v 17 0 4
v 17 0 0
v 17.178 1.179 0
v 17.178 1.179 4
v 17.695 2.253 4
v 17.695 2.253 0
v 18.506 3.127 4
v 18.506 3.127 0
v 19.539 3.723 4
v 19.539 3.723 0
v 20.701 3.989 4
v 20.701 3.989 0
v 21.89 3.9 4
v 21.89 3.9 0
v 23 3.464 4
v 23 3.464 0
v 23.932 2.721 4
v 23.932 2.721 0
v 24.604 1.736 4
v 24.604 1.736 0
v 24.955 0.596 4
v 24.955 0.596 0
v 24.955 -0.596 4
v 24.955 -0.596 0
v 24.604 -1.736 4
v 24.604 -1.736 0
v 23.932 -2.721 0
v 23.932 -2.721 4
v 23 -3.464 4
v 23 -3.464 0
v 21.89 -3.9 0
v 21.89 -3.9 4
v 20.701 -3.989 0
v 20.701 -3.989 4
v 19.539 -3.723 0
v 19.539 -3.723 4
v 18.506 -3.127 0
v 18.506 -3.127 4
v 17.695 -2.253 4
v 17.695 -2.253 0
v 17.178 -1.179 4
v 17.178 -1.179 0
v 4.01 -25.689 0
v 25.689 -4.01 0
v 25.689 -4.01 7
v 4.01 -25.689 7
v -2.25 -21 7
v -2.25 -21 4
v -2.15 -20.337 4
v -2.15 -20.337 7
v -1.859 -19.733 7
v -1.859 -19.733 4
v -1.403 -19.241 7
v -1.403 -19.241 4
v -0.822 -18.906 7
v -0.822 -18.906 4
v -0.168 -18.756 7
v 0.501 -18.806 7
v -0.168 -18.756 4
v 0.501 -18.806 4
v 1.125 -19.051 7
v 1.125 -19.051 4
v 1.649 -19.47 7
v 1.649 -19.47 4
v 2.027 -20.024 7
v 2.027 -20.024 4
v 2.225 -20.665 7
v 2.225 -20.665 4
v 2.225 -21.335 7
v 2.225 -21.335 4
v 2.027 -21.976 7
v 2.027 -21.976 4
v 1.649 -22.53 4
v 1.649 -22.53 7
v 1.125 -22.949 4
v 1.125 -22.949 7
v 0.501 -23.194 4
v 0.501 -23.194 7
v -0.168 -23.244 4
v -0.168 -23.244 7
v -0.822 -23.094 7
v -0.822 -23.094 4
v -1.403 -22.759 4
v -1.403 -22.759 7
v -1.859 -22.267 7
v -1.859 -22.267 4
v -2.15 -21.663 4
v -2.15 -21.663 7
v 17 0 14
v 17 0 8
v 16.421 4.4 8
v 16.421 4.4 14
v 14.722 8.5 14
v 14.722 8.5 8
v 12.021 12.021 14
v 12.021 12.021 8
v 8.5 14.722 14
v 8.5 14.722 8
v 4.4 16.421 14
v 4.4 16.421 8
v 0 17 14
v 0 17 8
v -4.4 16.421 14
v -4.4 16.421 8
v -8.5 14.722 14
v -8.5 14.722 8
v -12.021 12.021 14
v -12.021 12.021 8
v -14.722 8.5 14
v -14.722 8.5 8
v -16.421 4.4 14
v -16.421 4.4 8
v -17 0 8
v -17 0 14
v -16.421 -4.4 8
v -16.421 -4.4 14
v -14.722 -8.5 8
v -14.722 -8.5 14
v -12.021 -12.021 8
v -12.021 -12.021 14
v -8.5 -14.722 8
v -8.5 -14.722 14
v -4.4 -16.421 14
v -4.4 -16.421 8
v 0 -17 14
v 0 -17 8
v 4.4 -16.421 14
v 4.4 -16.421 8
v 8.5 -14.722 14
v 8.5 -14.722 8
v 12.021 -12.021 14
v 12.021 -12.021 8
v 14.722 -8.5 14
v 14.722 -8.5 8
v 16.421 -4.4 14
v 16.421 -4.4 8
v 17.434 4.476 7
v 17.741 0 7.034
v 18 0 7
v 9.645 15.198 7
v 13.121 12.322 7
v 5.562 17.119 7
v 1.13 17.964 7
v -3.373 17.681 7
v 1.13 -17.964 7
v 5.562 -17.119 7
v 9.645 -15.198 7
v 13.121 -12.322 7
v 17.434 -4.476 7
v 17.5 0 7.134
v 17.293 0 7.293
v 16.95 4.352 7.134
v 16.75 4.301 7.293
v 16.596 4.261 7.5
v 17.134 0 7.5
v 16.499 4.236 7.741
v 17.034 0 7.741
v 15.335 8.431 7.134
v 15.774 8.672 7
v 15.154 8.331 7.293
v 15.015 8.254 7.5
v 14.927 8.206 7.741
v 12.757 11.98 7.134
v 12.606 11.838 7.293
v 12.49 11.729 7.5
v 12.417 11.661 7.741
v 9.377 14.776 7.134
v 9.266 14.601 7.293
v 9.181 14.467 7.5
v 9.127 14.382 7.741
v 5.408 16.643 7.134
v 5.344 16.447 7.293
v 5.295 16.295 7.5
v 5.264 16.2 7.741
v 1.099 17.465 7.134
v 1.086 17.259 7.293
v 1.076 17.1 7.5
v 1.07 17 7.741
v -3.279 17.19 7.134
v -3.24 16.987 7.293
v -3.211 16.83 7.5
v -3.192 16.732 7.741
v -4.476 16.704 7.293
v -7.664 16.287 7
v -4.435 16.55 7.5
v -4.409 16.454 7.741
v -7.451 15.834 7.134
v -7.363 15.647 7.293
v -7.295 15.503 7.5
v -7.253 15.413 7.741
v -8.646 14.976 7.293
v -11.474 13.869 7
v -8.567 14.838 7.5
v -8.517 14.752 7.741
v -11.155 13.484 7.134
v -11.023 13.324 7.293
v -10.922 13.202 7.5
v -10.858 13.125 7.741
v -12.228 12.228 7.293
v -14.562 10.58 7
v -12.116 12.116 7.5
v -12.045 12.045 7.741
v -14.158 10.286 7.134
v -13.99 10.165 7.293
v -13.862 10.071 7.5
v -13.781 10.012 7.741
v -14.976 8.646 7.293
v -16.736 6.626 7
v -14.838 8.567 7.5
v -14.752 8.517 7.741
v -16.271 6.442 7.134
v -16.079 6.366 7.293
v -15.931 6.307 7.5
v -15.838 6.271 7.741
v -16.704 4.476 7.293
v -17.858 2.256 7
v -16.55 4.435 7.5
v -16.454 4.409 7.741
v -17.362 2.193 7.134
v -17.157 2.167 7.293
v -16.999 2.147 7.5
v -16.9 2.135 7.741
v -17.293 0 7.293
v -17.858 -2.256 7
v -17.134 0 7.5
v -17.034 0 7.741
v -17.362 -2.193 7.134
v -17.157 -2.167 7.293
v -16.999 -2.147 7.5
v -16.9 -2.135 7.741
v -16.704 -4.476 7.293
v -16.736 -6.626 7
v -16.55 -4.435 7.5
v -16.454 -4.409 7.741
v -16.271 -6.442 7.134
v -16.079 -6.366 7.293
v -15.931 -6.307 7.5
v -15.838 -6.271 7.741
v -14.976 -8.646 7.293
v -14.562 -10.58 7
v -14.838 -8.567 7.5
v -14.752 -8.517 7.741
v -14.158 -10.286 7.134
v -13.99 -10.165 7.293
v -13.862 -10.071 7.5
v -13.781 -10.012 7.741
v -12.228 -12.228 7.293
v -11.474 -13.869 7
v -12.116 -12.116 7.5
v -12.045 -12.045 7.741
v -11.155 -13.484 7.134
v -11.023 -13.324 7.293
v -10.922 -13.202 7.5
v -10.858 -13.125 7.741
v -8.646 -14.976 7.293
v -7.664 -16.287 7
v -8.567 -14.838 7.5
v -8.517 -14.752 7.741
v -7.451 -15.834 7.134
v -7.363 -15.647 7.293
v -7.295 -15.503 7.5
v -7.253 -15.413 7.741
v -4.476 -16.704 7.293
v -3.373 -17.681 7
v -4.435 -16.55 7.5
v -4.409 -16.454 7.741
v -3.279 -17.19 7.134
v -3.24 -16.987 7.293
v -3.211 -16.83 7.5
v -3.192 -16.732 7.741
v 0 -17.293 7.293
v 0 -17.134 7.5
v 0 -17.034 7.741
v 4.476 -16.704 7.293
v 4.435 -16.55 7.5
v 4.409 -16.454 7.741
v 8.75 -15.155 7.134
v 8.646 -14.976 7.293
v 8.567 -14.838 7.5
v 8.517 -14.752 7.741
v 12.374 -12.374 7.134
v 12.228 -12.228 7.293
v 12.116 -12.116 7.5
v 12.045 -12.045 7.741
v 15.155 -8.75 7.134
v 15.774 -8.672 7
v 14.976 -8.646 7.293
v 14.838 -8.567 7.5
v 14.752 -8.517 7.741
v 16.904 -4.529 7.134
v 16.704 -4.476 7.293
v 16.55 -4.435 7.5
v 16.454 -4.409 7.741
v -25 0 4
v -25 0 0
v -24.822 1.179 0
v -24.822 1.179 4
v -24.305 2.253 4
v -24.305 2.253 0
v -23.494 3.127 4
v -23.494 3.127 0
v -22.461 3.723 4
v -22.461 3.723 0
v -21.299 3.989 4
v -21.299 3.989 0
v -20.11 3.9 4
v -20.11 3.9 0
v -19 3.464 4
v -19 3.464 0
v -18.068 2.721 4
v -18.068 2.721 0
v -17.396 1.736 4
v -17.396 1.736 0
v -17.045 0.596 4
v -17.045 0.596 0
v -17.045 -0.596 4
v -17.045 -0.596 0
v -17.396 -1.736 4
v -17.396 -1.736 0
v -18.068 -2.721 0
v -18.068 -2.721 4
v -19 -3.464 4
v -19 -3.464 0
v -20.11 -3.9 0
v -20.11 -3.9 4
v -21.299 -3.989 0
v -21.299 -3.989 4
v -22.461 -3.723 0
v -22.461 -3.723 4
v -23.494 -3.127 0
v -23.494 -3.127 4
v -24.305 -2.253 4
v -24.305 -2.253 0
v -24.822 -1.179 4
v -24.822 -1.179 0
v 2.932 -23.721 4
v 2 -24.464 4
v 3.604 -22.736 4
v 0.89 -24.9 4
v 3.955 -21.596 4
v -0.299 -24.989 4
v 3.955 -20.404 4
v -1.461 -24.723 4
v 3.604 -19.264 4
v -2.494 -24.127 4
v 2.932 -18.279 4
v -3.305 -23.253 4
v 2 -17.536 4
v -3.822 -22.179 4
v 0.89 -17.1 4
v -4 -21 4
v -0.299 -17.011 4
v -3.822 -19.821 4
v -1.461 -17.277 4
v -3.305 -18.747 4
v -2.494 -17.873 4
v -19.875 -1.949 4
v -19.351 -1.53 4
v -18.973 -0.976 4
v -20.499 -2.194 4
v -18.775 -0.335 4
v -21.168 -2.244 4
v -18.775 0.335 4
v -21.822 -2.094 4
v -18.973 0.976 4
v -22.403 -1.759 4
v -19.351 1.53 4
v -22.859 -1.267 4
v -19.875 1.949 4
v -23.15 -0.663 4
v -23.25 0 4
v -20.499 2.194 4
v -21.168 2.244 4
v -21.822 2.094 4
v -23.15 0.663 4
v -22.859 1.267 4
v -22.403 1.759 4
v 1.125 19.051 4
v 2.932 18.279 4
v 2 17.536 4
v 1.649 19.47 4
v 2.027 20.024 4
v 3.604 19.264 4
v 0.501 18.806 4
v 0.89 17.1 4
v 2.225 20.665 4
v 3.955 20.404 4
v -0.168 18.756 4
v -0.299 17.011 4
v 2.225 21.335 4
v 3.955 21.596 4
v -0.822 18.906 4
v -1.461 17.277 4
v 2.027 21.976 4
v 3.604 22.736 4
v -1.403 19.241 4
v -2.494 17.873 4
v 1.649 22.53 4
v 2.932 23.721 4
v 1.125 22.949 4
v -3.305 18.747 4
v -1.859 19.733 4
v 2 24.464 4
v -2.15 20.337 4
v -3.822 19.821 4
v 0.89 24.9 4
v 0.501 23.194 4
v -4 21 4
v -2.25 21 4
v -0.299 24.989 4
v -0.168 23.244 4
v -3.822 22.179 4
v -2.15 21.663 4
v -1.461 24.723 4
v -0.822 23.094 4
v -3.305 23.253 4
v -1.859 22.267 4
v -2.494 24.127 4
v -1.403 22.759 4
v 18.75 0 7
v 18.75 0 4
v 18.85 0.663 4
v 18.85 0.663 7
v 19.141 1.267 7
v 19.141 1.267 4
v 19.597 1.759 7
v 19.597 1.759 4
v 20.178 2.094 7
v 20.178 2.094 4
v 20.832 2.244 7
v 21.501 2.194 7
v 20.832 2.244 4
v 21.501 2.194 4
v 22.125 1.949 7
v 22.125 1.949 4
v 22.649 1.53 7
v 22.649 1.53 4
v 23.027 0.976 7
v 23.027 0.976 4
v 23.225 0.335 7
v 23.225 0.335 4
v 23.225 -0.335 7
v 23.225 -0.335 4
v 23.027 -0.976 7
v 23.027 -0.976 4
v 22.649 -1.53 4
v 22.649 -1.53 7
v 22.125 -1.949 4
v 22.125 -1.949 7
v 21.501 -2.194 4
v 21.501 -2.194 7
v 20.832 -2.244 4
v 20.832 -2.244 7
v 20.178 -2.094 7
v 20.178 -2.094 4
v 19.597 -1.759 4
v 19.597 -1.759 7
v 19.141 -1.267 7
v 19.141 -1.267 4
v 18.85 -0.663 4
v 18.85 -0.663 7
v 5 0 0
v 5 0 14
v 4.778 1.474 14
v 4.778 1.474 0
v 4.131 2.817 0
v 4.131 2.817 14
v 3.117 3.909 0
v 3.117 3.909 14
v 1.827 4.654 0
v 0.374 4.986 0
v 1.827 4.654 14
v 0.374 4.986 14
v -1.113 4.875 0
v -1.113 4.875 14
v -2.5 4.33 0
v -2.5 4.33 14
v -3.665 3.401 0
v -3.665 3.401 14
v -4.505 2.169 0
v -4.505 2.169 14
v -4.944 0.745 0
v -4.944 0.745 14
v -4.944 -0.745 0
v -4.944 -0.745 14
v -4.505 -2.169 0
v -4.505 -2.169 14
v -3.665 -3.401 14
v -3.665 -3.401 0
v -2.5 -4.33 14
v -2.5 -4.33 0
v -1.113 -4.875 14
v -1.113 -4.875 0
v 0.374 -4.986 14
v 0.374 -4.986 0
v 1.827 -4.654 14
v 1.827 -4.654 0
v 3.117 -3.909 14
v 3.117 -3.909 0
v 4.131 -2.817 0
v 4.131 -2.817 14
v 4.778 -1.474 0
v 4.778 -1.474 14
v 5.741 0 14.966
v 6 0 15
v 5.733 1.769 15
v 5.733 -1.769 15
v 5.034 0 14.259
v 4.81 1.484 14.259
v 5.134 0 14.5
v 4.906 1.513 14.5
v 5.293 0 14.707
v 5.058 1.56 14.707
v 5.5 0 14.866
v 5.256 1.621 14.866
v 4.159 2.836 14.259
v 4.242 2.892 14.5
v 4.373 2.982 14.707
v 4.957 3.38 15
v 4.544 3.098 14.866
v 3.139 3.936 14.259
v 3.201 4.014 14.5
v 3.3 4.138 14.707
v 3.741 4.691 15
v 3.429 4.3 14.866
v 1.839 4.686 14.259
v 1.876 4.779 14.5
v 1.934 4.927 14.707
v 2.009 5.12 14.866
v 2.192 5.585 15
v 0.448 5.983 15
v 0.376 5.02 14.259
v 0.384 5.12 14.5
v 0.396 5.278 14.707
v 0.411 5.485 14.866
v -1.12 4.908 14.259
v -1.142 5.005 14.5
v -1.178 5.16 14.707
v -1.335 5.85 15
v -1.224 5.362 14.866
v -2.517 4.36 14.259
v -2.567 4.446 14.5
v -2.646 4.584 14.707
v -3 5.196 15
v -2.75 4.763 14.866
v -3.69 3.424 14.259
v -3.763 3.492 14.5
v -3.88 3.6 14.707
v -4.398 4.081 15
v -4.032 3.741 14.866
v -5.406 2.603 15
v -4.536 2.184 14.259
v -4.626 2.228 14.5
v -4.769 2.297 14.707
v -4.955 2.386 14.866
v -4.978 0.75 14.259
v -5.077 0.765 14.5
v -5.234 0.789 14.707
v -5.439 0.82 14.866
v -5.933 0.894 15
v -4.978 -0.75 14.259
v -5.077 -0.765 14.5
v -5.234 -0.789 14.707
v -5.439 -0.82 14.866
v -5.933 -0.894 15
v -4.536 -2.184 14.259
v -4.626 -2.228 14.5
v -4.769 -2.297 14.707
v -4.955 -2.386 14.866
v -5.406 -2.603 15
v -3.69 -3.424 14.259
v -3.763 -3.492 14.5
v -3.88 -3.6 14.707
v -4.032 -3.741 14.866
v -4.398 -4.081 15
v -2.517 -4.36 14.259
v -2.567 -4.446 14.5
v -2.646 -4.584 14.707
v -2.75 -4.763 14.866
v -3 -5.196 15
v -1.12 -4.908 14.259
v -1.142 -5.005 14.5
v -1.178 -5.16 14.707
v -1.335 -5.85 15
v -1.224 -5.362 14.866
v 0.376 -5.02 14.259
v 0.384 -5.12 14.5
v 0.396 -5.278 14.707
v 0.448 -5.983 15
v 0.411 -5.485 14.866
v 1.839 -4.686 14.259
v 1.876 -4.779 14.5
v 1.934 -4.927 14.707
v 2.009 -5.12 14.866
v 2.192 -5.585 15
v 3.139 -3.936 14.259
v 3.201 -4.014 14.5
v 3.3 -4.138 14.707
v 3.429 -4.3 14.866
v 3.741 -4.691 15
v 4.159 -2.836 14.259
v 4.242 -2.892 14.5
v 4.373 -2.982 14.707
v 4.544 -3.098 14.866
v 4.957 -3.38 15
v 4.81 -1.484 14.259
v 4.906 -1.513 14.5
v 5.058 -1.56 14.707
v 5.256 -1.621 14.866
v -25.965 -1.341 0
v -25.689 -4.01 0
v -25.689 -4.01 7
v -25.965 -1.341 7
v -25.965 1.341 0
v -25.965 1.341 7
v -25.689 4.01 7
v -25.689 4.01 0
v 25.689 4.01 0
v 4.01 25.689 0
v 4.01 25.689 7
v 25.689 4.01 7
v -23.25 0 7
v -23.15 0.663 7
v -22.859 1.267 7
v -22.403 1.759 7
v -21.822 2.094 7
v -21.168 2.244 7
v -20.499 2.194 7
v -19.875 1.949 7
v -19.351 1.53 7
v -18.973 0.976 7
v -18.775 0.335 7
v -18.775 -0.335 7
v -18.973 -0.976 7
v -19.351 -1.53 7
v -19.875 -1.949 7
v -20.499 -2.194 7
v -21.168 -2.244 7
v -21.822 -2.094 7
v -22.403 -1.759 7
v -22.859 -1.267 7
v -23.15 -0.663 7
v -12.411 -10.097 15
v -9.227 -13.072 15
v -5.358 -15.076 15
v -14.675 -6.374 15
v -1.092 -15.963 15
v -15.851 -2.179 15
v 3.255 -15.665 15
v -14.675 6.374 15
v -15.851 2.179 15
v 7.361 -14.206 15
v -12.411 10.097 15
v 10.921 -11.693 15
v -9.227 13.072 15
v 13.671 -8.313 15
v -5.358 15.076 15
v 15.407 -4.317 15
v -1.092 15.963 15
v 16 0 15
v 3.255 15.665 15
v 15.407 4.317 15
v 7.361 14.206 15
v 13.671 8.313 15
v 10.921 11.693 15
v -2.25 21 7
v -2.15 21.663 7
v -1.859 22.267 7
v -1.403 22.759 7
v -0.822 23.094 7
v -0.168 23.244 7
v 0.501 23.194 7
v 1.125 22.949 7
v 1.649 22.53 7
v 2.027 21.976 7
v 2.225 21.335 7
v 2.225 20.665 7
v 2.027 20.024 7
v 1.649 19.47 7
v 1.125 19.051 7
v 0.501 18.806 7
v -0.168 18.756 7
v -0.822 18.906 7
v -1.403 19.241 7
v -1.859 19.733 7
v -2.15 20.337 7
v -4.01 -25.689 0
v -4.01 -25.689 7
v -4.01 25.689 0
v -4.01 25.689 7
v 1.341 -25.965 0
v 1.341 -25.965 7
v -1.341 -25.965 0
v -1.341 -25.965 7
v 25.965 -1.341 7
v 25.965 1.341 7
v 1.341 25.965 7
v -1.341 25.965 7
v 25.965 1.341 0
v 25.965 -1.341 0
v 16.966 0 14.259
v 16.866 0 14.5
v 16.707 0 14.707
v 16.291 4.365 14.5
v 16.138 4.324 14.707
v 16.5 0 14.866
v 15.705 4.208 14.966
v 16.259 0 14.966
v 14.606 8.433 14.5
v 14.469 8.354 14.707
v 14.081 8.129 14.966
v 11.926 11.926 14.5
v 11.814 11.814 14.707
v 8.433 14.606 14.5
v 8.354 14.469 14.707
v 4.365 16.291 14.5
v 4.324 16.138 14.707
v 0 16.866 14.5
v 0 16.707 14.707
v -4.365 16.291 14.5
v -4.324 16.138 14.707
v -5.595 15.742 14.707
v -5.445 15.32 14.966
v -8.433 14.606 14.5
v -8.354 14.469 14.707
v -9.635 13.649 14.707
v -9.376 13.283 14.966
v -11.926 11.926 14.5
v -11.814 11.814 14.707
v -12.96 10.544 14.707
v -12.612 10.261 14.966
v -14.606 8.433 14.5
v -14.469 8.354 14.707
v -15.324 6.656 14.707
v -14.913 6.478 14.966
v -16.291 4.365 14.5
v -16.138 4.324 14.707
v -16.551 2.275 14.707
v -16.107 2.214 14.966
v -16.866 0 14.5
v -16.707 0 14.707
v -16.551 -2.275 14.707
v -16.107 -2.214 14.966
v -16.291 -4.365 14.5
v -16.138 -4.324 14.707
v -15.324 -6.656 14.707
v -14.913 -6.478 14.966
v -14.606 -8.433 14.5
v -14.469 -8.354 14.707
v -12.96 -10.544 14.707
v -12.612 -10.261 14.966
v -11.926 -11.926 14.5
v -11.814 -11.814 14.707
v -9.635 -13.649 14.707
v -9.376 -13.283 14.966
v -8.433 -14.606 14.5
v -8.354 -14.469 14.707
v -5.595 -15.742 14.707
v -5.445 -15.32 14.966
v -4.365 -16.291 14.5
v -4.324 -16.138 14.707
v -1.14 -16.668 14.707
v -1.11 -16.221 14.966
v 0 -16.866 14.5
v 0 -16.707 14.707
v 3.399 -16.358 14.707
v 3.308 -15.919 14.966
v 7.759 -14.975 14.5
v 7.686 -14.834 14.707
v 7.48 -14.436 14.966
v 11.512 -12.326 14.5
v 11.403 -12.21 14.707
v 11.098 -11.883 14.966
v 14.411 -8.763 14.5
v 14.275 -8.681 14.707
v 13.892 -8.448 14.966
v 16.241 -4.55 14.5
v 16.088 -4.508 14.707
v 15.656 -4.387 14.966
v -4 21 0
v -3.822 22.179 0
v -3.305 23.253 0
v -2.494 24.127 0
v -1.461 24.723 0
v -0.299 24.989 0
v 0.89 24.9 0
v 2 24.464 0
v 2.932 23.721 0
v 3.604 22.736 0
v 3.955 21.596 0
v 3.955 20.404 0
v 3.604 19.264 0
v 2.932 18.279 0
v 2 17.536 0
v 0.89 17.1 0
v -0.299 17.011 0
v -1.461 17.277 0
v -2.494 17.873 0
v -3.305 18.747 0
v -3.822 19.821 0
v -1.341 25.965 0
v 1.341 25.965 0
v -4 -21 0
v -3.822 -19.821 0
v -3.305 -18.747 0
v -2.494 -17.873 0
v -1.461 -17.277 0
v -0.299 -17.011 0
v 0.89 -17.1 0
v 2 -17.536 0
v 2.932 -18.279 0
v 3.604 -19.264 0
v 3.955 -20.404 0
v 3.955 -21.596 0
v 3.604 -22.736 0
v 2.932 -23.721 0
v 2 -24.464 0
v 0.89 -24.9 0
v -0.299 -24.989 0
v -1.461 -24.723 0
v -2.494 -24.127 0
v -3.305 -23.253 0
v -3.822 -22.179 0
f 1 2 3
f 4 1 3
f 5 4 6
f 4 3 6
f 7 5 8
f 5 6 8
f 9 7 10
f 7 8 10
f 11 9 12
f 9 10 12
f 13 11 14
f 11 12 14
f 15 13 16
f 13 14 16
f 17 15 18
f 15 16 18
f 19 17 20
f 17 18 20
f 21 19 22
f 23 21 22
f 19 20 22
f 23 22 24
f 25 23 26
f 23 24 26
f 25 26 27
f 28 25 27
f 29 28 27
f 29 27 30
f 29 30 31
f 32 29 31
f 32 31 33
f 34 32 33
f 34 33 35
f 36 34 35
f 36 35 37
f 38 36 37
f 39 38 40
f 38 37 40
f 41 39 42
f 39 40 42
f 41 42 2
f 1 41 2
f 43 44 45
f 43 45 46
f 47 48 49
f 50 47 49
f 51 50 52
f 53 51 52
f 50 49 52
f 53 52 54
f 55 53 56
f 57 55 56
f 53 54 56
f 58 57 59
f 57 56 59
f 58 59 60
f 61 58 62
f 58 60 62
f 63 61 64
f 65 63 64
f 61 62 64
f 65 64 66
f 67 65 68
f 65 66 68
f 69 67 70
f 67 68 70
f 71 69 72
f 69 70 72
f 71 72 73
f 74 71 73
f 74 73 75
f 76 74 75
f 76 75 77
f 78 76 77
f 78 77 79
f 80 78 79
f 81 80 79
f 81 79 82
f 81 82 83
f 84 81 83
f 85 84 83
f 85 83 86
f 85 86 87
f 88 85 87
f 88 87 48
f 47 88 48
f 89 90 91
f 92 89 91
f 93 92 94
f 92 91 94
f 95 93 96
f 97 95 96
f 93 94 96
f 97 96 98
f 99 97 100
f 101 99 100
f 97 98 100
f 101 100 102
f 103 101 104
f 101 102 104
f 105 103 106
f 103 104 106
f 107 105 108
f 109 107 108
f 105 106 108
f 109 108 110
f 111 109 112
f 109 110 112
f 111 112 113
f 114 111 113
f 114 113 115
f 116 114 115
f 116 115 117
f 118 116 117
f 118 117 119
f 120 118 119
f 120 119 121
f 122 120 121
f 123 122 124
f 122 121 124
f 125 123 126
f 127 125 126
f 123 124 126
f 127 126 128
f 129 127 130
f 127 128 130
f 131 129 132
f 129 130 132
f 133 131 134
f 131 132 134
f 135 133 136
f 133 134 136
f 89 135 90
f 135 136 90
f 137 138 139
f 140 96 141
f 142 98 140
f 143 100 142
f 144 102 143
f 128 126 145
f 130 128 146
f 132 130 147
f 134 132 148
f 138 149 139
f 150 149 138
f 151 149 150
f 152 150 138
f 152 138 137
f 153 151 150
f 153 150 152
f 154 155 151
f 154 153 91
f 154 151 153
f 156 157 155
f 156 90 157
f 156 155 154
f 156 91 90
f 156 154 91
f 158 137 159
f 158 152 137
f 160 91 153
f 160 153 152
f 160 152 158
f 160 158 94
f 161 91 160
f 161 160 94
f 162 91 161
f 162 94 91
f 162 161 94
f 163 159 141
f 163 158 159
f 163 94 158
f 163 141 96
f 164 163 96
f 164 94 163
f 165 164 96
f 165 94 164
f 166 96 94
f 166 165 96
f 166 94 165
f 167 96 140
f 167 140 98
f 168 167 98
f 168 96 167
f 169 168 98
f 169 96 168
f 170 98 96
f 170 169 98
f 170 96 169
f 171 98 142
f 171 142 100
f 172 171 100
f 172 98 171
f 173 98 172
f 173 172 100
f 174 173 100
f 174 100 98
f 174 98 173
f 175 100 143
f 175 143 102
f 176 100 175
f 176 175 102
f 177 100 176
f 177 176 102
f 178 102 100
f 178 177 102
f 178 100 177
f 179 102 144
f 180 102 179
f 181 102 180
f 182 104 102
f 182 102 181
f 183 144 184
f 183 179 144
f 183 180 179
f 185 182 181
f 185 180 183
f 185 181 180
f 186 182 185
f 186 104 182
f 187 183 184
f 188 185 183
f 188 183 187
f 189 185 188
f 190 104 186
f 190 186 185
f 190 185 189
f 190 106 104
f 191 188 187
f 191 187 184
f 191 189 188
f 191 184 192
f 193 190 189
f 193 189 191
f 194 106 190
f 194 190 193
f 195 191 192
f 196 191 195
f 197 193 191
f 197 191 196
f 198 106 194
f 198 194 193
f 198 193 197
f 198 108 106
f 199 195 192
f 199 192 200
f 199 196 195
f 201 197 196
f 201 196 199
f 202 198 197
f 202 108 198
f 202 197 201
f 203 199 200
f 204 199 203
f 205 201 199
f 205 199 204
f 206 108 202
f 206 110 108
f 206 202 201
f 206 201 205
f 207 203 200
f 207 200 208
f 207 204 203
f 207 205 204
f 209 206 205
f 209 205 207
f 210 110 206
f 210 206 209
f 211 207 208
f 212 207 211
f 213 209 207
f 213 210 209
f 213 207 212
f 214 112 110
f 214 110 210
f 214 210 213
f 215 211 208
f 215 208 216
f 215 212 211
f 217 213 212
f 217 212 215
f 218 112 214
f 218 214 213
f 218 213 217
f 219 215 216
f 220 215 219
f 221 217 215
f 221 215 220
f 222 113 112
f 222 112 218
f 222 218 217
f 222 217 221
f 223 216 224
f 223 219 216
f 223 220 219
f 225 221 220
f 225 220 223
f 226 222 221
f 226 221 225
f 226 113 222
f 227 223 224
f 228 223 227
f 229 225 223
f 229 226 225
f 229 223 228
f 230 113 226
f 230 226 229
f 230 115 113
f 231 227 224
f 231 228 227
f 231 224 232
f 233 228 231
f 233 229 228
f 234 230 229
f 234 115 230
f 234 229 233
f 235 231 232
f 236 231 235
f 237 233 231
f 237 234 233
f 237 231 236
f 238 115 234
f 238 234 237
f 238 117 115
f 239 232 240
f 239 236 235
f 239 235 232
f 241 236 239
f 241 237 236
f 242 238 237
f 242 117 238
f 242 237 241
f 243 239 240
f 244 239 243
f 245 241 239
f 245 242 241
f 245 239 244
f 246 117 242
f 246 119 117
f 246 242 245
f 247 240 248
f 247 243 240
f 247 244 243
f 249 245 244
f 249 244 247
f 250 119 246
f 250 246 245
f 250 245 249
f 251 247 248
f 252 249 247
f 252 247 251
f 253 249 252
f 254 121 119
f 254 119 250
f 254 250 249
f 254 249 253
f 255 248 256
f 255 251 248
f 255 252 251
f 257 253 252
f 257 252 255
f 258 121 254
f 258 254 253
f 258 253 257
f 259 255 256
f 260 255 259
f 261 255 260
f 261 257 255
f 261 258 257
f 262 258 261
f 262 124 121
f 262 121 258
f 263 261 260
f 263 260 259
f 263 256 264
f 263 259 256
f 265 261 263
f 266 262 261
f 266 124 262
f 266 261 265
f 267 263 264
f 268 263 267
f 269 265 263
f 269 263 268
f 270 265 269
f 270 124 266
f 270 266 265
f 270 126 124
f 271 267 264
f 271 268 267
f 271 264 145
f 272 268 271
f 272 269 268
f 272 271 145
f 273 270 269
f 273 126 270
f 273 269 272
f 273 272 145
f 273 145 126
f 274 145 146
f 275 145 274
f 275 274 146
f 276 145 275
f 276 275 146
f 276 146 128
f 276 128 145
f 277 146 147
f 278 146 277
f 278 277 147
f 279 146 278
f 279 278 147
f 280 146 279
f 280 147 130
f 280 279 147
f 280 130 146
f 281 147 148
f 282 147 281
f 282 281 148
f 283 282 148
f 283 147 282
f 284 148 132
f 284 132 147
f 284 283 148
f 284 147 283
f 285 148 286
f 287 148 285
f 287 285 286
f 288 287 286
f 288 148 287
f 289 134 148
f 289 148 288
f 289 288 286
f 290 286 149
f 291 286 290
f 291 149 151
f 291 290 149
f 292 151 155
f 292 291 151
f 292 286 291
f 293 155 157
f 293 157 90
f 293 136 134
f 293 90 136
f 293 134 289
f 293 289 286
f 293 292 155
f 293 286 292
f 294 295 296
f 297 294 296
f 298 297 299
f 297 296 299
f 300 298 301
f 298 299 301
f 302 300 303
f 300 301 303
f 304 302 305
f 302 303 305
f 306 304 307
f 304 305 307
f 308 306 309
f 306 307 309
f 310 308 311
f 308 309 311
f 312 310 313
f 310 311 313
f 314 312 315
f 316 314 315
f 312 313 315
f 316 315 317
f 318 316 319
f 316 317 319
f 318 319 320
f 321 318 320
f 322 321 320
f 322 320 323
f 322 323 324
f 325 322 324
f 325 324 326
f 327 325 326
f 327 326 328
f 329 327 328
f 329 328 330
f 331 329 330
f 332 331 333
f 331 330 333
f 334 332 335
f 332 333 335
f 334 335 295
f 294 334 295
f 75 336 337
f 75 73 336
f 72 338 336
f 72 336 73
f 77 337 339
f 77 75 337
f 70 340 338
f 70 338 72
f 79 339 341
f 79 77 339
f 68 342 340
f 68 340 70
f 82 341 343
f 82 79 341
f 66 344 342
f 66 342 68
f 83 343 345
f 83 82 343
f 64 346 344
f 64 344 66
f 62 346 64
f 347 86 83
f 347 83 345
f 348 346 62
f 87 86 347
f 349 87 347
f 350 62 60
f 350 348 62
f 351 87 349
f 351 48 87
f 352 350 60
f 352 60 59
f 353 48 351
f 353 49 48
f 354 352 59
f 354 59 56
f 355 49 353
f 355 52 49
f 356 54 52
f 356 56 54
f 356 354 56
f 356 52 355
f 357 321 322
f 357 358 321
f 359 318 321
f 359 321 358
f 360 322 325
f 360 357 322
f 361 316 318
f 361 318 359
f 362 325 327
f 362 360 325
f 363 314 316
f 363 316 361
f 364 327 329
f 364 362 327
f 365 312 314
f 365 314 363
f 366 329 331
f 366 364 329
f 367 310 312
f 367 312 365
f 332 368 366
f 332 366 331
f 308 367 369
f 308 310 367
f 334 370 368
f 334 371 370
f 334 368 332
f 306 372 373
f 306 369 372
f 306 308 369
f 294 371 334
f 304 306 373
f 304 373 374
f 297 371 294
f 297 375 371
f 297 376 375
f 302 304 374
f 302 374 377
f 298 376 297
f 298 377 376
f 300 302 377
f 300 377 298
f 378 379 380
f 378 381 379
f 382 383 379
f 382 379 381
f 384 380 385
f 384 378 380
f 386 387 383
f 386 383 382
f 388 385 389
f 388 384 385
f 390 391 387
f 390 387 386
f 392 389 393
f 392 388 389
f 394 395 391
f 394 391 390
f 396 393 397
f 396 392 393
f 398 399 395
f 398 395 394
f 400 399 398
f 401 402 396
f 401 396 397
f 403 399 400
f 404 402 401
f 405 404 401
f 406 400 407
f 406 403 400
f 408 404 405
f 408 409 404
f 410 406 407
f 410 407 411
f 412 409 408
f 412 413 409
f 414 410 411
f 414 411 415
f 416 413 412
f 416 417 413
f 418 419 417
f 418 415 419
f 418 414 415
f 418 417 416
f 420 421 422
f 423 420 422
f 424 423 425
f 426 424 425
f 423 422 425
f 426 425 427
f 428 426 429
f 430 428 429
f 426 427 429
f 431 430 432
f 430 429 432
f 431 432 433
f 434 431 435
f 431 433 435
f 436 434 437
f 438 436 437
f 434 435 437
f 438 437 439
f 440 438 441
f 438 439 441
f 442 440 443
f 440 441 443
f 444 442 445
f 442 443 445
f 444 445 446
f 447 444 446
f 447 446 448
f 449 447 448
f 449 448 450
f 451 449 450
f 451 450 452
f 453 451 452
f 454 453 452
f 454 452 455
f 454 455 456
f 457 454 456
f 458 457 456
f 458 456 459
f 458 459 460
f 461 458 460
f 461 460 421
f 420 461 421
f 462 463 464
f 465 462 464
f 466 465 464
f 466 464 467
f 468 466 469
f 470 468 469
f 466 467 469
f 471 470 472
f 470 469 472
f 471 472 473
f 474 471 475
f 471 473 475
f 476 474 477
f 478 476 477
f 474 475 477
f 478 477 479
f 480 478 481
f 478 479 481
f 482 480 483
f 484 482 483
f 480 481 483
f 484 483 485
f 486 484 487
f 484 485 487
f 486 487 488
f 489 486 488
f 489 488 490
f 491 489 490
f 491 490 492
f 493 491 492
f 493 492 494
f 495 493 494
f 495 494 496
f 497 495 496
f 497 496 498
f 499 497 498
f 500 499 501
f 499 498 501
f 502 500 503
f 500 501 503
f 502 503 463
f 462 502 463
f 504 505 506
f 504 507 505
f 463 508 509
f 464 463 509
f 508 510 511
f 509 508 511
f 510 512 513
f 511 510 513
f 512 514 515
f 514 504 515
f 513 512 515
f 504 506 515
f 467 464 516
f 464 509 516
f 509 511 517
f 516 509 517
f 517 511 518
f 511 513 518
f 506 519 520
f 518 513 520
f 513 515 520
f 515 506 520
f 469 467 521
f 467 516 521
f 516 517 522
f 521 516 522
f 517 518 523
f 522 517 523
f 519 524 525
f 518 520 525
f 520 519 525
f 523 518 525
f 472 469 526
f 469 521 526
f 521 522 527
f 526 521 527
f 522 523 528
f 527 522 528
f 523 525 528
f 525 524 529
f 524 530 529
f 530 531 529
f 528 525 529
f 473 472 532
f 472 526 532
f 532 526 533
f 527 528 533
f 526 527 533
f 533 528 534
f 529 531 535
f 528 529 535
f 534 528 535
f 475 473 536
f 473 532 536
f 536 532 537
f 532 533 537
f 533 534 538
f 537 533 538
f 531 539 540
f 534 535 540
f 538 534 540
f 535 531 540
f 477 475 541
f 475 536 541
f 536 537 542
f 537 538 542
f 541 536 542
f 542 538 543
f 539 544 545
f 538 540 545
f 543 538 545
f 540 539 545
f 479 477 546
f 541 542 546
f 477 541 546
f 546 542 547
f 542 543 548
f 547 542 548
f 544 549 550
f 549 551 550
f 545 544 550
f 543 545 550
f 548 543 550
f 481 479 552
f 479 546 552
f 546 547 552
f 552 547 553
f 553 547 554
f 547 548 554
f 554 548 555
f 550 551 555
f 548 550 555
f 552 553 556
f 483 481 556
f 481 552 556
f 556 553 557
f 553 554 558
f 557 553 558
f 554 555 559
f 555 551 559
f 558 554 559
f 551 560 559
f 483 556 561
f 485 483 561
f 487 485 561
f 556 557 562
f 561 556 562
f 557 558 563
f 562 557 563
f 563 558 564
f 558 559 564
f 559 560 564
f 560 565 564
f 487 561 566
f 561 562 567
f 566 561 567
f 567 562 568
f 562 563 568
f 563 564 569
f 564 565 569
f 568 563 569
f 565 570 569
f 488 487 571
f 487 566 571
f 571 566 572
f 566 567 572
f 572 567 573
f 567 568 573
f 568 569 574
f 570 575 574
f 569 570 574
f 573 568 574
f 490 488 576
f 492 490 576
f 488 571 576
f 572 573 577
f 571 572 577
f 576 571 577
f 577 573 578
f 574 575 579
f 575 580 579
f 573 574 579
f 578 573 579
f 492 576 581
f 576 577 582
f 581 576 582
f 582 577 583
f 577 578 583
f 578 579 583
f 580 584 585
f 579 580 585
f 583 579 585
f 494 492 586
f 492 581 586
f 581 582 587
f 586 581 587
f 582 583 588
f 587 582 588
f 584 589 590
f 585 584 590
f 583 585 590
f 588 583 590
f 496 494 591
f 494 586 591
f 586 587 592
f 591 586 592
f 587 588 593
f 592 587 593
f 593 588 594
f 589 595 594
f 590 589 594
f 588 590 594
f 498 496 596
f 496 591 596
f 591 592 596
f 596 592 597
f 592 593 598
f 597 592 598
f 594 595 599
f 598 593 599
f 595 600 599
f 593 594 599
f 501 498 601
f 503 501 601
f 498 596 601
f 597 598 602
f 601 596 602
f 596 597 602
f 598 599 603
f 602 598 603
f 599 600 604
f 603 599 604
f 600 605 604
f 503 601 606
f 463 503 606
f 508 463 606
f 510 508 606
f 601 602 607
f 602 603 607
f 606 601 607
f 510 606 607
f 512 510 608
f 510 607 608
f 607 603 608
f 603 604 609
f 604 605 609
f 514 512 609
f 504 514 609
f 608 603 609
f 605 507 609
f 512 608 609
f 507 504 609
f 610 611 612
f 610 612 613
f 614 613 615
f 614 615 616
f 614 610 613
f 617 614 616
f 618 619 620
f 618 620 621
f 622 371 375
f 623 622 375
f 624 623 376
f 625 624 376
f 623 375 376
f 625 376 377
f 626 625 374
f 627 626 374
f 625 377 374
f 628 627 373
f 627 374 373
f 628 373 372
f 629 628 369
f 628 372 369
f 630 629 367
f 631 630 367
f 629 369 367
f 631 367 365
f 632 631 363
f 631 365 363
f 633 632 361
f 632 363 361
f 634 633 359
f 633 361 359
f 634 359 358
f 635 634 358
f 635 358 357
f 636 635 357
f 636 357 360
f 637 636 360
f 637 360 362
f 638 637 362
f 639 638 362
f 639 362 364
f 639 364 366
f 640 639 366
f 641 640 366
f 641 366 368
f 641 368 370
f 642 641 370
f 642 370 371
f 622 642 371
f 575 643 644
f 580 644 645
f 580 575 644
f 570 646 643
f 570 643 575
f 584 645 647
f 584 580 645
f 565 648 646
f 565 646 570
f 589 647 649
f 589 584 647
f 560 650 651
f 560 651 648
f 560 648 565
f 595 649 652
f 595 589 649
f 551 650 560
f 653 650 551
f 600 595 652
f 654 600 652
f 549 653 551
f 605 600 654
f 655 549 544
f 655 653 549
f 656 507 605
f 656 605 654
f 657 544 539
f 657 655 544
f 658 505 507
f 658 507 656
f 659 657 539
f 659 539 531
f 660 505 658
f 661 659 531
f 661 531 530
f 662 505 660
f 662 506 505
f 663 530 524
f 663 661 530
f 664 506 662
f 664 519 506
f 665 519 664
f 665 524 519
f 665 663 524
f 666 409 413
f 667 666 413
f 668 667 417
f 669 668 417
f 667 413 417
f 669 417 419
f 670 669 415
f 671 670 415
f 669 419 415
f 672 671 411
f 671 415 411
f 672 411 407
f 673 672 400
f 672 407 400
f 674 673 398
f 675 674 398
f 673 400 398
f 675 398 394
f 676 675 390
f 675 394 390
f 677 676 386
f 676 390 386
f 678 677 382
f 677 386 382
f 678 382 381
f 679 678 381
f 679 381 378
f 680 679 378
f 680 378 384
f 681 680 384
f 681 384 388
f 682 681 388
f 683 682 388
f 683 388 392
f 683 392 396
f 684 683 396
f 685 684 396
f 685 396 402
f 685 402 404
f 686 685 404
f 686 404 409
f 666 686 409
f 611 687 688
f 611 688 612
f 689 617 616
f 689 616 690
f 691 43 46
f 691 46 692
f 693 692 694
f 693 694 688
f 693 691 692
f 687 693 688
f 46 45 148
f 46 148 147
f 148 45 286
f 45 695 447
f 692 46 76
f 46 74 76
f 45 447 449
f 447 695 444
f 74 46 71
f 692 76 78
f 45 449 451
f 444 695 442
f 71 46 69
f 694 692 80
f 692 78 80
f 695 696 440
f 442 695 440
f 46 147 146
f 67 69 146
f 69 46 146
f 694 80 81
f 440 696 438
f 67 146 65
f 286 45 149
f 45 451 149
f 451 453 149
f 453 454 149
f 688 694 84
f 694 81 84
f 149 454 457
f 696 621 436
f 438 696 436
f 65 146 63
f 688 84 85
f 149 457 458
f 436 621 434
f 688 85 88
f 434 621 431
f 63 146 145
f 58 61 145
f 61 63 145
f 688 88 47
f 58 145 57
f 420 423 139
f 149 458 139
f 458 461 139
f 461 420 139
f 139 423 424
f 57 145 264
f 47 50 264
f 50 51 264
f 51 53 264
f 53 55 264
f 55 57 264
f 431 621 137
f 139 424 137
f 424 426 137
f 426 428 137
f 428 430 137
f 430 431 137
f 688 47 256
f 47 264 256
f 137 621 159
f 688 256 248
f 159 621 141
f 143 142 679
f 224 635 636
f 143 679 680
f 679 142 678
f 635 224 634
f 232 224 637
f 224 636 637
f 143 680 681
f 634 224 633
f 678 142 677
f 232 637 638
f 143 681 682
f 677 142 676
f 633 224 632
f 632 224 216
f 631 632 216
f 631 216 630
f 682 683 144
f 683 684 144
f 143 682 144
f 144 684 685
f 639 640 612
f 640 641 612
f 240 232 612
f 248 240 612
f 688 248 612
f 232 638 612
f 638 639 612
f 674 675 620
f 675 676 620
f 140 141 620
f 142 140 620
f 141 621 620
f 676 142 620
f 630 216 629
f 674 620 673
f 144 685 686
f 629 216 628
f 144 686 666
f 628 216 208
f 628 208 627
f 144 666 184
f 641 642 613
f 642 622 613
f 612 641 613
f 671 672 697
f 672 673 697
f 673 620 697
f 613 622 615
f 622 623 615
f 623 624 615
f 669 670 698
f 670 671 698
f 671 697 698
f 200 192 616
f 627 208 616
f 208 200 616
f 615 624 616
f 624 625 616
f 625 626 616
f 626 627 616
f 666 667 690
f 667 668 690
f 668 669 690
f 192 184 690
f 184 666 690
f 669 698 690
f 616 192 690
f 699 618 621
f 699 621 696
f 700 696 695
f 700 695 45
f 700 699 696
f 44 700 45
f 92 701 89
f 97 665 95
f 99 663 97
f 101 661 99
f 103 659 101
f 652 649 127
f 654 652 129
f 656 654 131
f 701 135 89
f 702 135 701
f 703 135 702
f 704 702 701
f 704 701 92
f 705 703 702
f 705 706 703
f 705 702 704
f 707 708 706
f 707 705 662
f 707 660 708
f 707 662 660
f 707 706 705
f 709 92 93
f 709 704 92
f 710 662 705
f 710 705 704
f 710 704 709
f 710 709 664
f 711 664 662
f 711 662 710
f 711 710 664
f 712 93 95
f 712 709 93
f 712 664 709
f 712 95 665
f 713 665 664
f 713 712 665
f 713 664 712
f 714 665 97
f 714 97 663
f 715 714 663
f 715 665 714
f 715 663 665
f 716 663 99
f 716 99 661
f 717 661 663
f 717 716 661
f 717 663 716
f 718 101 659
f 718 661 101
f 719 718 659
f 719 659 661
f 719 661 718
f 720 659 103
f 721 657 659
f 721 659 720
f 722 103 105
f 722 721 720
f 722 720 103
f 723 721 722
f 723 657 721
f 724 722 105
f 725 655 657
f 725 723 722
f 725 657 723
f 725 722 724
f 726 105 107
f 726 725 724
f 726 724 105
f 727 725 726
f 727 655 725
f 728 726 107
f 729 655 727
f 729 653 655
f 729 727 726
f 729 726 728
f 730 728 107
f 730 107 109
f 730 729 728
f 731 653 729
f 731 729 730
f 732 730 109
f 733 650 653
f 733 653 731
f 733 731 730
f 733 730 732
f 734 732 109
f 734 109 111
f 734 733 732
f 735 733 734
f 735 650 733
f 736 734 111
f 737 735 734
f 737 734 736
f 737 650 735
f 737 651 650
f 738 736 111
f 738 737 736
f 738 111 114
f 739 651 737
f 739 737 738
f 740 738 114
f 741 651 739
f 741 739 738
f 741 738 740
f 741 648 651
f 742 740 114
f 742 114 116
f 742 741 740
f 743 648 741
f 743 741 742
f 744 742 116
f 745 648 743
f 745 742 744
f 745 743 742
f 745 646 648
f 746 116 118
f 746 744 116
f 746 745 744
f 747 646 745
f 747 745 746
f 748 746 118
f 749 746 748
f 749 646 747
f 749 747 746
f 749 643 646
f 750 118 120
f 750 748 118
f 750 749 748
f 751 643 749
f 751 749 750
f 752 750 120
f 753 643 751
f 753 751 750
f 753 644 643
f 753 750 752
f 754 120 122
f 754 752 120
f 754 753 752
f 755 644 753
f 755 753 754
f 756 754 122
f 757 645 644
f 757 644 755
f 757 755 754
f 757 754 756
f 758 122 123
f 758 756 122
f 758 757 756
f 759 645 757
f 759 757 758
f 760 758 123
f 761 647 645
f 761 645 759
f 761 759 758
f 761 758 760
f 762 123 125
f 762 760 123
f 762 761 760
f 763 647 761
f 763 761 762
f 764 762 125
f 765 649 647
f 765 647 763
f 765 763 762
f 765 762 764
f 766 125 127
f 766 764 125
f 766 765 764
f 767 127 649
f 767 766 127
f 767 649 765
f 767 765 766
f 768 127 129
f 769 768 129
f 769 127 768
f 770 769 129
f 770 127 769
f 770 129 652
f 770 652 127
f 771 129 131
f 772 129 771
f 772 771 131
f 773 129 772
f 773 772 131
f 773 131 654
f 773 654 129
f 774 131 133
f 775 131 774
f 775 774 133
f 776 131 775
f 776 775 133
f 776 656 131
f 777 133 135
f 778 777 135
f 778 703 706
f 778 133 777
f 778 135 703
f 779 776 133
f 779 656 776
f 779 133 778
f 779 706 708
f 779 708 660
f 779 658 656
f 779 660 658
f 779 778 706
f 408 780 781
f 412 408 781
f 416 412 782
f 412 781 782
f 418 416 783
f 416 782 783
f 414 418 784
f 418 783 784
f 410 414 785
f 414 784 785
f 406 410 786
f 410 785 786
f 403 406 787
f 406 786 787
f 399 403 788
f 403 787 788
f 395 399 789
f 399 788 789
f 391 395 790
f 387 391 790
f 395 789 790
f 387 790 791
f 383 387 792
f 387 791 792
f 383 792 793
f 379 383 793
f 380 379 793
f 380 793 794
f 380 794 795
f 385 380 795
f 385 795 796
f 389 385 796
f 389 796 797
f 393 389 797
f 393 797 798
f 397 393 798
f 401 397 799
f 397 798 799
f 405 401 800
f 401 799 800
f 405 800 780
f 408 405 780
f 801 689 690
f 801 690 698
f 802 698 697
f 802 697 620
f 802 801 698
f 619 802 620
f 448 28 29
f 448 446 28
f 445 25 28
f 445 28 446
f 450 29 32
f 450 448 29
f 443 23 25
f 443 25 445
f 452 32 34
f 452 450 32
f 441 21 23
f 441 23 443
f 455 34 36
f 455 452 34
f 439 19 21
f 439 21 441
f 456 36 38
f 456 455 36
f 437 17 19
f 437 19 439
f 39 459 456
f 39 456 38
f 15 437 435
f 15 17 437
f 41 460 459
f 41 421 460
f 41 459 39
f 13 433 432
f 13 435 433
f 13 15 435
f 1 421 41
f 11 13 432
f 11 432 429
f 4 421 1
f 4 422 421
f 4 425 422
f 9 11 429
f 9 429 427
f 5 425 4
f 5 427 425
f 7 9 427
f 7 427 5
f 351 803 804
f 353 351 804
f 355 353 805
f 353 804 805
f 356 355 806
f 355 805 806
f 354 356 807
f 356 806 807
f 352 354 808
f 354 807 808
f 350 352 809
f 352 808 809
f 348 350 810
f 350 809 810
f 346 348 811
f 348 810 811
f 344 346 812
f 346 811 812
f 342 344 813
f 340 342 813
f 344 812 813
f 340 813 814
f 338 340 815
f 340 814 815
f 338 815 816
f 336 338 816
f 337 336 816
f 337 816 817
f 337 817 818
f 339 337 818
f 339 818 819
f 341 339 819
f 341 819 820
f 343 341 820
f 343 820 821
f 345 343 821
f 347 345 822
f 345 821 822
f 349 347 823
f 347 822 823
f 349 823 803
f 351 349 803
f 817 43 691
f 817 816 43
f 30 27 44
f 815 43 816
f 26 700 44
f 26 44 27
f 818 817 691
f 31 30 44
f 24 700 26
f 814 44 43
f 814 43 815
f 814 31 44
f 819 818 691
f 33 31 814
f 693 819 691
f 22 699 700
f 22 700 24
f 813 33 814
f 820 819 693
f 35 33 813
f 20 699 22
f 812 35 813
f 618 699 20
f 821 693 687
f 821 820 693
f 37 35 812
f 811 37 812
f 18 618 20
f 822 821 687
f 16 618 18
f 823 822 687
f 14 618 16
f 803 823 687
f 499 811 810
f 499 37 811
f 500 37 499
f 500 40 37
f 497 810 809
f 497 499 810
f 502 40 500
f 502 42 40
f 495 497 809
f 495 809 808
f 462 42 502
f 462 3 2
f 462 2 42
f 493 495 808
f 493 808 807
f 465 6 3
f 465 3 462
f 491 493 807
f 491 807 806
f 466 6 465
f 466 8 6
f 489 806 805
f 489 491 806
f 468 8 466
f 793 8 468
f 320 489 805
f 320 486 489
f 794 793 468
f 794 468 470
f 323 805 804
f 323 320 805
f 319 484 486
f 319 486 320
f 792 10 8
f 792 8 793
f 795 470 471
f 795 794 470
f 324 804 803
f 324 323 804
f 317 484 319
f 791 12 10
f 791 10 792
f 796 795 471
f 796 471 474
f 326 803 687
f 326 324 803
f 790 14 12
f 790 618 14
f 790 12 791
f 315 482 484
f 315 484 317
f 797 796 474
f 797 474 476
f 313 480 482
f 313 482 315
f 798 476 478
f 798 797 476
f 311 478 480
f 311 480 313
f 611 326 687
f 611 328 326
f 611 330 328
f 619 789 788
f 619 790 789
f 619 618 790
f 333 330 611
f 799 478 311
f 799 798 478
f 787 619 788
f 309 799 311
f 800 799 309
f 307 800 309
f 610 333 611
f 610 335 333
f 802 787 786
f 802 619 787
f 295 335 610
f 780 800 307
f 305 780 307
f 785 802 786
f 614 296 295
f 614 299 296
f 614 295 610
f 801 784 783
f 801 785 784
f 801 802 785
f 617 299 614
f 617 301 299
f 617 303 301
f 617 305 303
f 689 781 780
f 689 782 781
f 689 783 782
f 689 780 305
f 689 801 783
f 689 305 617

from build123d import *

# Parameters (mm, degrees)
BOSS_EXTRUDE1_DEPTH = 7
SKETCH2_R           = 4
CUT_EXTRUDE1_DEPTH  = 4
SKETCH3_R           = 2.25
CUT_EXTRUDE2_DEPTH  = 4
SKETCH4_R           = 17
BOSS_EXTRUDE2_DEPTH = 8
SKETCH5_R           = 5
CUT_EXTRUDE3_DEPTH  = 15
FILLET3_R           = 1


with BuildPart() as part:
    # Sketch1 → Boss-Extrude1 (new body)
    with BuildSketch(Plane.XY):
        with BuildLine():
            Line((-14.849242405, -14.849242405), (-25.688984099, -4.009500711))
            ThreePointArc((-25.688984099, -4.009500711), (-26, 0), (-25.688984099, 4.009500711))
            Line((-25.688984099, 4.009500711), (-14.849242405, 14.849242405))
            Line((-14.849242405, 14.849242405), (-4.009500711, 25.688984099))
            ThreePointArc((-4.009500711, 25.688984099), (0, 26), (4.009500711, 25.688984099))
            Line((4.009500711, 25.688984099), (14.849242405, 14.849242405))
            Line((14.849242405, 14.849242405), (25.688984099, 4.009500711))
            ThreePointArc((25.688984099, 4.009500711), (26, 0), (25.688984099, -4.009500711))
            Line((25.688984099, -4.009500711), (14.849242405, -14.849242405))
            Line((14.849242405, -14.849242405), (4.009500711, -25.688984099))
            ThreePointArc((4.009500711, -25.688984099), (0, -26), (-4.009500711, -25.688984099))
            Line((-4.009500711, -25.688984099), (-14.849242405, -14.849242405))
        make_face()
    extrude(amount=BOSS_EXTRUDE1_DEPTH)

    # Sketch2 → Cut-Extrude1 (cut)
    with BuildSketch(Plane(origin=(0, 0, 0), x_dir=(-1, 0, 0), z_dir=(0, 0, -1))):
        with Locations((0, 21)):
            Circle(SKETCH2_R)
        with Locations((-21, 0)):
            Circle(SKETCH2_R)
        with Locations((0, -21)):
            Circle(SKETCH2_R)
        with Locations((21, 0)):
            Circle(SKETCH2_R)
    extrude(amount=-CUT_EXTRUDE1_DEPTH, mode=Mode.SUBTRACT)

    # Sketch3 → Cut-Extrude2 (cut)
    with BuildSketch(Plane(origin=(0, 0, 4), x_dir=(-1, 0, 0), z_dir=(0, 0, -1))):
        with Locations((0, 21)):
            Circle(SKETCH3_R)
        with Locations((-21, 0)):
            Circle(SKETCH3_R)
        with Locations((21, 0)):
            Circle(SKETCH3_R)
        with Locations((0, -21)):
            Circle(SKETCH3_R)
    extrude(amount=-CUT_EXTRUDE2_DEPTH, mode=Mode.SUBTRACT)

    # Sketch4 → Boss-Extrude2 (add)
    with BuildSketch(Plane.XY.offset(7)):
        Circle(SKETCH4_R)
    extrude(amount=BOSS_EXTRUDE2_DEPTH)

    # Sketch5 → Cut-Extrude3 (cut)
    with BuildSketch(Plane.XY.offset(15)):
        Circle(SKETCH5_R)
    extrude(amount=-CUT_EXTRUDE3_DEPTH, mode=Mode.SUBTRACT)

    # Fillet3
    fillet3_edges = [part.edges().sort_by_distance(p)[0] for p in [
        (-17, 0, 7),
        (-17, 0, 15),
        (-5, 0, 15),
    ]]
    fillet(fillet3_edges, radius=FILLET3_R)


solid = part.part
